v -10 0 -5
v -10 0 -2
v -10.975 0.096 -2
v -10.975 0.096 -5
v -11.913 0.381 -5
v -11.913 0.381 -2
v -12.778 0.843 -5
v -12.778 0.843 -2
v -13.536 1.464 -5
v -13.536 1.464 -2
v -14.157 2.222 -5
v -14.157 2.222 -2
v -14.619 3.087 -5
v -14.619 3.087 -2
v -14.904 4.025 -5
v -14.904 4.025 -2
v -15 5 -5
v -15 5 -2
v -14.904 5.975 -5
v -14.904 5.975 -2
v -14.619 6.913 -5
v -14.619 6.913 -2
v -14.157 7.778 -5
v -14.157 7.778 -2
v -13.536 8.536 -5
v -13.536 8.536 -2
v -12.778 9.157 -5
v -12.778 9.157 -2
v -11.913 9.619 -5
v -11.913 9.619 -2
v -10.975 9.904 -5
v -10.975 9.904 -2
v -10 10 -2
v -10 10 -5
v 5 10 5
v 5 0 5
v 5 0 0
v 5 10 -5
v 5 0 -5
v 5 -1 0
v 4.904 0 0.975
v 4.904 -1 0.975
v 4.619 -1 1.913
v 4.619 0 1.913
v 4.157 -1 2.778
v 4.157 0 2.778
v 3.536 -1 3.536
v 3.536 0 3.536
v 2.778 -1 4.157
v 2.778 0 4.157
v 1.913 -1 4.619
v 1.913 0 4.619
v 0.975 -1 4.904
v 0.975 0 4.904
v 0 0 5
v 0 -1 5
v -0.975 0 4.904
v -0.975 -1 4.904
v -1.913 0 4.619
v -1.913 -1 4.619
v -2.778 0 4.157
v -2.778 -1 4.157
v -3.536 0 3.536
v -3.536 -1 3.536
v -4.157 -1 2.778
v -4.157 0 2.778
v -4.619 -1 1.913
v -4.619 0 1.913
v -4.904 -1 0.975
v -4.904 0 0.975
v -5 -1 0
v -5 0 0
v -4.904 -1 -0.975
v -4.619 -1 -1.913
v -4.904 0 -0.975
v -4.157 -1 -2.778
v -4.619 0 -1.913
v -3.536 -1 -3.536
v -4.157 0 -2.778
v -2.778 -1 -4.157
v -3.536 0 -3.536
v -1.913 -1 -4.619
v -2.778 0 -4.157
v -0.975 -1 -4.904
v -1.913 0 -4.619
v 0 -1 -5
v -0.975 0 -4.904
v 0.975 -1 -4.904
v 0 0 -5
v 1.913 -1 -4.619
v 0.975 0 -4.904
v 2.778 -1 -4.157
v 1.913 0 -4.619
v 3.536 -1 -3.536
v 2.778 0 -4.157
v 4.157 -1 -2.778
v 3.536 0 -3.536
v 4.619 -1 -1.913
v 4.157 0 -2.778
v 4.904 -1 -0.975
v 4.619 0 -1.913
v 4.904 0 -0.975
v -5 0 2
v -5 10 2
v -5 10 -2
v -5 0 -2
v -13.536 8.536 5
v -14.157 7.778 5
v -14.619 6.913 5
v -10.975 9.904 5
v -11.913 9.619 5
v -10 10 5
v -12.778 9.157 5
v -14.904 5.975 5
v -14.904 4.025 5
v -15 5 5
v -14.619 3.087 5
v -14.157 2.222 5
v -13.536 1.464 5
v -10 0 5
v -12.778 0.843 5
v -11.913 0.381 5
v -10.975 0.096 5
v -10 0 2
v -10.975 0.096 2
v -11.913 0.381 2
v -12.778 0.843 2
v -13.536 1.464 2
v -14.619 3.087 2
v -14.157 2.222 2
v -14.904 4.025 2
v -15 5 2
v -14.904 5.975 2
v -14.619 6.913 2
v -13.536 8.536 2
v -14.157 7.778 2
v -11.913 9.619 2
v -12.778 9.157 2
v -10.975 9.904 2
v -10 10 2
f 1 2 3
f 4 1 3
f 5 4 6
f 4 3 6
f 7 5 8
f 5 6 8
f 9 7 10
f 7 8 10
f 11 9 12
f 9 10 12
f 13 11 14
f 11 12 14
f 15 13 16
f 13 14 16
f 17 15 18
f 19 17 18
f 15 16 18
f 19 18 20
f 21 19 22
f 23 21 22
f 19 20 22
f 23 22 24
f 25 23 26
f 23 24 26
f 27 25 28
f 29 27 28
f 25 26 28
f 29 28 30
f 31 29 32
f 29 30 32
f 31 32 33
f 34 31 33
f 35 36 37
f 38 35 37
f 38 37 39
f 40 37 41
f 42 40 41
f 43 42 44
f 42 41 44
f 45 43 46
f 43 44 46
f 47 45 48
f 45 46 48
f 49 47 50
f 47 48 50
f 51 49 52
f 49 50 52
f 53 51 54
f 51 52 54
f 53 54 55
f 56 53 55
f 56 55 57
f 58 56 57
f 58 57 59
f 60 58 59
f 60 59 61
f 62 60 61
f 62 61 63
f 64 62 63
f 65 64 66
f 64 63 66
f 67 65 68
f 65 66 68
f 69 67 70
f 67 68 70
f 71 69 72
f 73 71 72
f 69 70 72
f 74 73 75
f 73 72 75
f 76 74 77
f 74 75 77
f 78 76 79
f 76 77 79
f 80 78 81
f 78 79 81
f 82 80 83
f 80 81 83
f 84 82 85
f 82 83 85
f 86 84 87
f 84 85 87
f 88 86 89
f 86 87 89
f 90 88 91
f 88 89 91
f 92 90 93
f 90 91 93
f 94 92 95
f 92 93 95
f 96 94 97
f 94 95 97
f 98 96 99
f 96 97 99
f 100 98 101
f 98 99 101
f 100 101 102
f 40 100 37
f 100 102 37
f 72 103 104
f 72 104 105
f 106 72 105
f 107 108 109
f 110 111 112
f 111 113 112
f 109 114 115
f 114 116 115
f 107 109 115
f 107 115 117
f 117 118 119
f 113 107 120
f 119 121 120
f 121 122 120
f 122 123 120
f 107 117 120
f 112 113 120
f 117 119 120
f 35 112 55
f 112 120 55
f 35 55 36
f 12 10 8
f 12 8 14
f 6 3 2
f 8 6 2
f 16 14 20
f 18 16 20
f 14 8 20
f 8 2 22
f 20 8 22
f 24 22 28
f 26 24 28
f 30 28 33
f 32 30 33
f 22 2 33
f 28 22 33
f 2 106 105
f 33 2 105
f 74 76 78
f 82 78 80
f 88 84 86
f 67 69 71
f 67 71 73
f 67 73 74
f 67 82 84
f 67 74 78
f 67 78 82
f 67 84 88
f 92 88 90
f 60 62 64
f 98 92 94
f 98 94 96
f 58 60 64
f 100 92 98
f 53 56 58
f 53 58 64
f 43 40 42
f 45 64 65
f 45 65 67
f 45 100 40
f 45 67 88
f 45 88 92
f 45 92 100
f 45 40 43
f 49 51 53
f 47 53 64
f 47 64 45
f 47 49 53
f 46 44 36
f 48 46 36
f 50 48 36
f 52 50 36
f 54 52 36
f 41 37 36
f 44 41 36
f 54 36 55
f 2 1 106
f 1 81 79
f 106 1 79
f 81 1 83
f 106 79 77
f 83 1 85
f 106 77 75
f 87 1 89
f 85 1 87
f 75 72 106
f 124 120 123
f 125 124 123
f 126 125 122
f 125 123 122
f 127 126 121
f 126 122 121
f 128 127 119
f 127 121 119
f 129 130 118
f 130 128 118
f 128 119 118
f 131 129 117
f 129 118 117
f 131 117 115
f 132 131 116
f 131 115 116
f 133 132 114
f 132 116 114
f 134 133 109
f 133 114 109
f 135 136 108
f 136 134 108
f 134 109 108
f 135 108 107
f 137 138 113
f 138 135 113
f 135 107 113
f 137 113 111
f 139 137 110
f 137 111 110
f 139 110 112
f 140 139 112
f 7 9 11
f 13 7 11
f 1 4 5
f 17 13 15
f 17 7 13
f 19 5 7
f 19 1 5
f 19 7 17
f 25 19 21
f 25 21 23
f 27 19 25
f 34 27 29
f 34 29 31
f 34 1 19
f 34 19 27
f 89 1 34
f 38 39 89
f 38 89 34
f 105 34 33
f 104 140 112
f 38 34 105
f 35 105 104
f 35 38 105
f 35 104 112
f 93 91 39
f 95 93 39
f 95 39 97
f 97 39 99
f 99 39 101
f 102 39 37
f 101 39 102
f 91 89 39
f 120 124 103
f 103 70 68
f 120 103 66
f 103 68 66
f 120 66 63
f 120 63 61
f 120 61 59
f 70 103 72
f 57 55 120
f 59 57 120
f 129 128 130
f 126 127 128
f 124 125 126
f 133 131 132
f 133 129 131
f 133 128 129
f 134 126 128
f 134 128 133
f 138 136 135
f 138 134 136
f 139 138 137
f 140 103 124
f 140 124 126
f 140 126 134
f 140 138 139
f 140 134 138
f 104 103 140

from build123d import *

# Parameters (mm, degrees)
SKETCH_1_W          = 10
SKETCH_1_H          = 10
EXTRUDE_1_DEPTH     = 10
SKETCH_2_W          = 3
SKETCH_2_H          = 10
EXTRUDE_2_DEPTH     = 10
CUT_EXTRUDE_1_DEPTH = 10
SKETCH_4_R          = 5
EXTRUDE_3_DEPTH     = 1


with BuildPart() as part:
    # 草图1 → 凸台-拉伸1 (new body)
    with BuildSketch(Plane(origin=(0, 0, 0), x_dir=(1, 0, 0), z_dir=(0, 1, 0))):
        Rectangle(SKETCH_1_W, SKETCH_1_H)
    extrude(amount=EXTRUDE_1_DEPTH)

    # 草图2 → 凸台-拉伸2 (add)
    with BuildSketch(Plane.ZY.offset(5)):
        with Locations((-3.5, 5)):
            Rectangle(SKETCH_2_W, SKETCH_2_H)
        with Locations((3.5, 5)):
            Rectangle(SKETCH_2_W, SKETCH_2_H)
    extrude(amount=EXTRUDE_2_DEPTH)

    # 草图3 → 切除-拉伸1 (cut)
    with BuildSketch(Plane.XY.offset(5)):
        with BuildLine():
            Line((-10, 10), (-17.018915749, 10))
            Line((-17.018915749, 10), (-17.018915749, 0))
            Line((-17.018915749, 0), (-10, 0))
            ThreePointArc((-10, 0), (-15, 5), (-10, 10))
        make_face()
    extrude(amount=-CUT_EXTRUDE_1_DEPTH, mode=Mode.SUBTRACT)

    # 草图4 → 凸台-拉伸3 (add)
    with BuildSketch(Plane.XZ):
        Circle(SKETCH_4_R)
    extrude(amount=EXTRUDE_3_DEPTH)


solid = part.part
